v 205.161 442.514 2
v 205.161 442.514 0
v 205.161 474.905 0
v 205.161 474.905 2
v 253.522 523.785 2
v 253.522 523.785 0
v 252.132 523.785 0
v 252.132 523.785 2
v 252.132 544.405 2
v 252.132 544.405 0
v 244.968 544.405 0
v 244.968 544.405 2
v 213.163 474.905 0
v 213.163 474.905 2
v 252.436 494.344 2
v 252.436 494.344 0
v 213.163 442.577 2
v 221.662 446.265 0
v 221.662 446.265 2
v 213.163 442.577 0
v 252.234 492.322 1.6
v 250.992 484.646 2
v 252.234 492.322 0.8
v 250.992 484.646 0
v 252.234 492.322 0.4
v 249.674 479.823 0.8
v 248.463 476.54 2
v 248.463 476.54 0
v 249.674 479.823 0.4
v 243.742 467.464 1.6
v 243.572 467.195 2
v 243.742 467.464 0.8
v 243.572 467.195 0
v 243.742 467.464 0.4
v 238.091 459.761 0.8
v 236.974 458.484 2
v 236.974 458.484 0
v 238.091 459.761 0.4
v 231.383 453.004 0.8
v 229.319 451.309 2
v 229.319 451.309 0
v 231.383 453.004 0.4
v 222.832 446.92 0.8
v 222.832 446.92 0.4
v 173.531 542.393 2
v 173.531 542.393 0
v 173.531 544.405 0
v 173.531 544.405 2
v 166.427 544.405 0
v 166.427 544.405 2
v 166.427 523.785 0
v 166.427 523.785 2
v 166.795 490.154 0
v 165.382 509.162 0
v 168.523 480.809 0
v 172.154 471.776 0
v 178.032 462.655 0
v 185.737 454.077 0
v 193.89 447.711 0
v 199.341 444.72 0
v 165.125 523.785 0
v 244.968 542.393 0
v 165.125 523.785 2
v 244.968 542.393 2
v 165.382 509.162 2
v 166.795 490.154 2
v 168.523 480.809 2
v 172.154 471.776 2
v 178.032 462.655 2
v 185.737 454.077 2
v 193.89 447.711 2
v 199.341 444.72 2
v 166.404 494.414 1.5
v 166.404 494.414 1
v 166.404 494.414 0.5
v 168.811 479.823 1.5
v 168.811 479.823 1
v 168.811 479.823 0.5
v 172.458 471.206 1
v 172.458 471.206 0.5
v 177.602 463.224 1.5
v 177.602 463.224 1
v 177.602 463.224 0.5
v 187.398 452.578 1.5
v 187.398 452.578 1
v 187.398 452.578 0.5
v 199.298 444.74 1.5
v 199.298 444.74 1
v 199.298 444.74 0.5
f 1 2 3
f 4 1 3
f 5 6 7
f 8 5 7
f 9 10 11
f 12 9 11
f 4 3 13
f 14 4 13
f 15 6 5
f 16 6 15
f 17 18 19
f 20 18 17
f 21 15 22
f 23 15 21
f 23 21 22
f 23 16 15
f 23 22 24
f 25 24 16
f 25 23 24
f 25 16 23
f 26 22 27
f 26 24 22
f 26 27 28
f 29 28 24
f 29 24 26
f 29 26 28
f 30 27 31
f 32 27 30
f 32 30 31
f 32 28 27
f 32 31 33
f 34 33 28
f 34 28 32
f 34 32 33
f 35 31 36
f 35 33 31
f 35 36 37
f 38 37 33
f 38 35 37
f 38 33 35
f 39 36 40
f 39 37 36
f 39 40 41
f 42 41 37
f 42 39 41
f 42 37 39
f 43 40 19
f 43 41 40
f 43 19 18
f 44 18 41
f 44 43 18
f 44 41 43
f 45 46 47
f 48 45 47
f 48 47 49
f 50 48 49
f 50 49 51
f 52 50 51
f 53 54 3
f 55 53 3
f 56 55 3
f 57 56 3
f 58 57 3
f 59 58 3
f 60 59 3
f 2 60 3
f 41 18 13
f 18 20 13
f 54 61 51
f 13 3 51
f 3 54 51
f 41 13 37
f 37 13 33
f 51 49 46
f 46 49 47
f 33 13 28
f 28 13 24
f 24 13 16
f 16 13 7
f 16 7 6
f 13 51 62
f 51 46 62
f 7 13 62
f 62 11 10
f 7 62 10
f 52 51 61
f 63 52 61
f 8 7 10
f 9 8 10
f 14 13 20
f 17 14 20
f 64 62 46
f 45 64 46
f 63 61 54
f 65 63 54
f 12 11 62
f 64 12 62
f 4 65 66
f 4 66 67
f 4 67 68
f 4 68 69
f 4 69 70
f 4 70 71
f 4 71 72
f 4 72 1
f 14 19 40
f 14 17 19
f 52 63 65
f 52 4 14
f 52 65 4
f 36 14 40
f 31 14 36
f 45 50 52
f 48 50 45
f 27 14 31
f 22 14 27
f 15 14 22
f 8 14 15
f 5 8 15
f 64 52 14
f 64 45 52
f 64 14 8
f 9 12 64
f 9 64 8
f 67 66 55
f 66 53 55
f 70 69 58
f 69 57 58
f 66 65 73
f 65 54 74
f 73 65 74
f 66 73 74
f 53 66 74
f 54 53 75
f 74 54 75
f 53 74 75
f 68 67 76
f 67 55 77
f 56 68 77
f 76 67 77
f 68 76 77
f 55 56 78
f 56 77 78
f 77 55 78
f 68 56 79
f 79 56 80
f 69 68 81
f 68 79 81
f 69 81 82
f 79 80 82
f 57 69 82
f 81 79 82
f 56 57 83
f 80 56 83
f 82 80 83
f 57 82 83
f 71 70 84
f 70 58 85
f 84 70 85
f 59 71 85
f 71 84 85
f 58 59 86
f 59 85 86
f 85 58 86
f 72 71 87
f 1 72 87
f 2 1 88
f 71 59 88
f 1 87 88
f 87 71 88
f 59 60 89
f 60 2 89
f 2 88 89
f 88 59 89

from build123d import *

# Parameters (mm, degrees)
EXTRUDE_1_DEPTH = 2


with BuildPart() as part:
    # 草图1 → 凸台-拉伸1 (new body)
    with BuildSketch(Plane.XY):
        with BuildLine():
            Line((244.967841267, 542.393386476), (173.531139847, 542.393386476))
            Line((173.531139847, 542.393386476), (173.531139847, 544.404513771))
            Line((173.531139847, 544.404513771), (166.427186265, 544.404513771))
            Line((166.427186265, 544.404513771), (166.427186265, 523.784577737))
            Line((166.427186265, 523.784577737), (165.125301121, 523.784577737))
            Line((165.125301121, 523.784577737), (165.381520735, 509.161664861))
            add(Edge.make_bspline(
                [(165.381520735, 509.161664861), (166.398492196, 499.581380375), (165.660716299, 482.596552628), (178.57521294, 459.918617671), (192.311763969, 447.256935323), (203.145863385, 443.111286653), (205.16102947, 442.514323356)],
                knots=[0, 0, 0, 0, 0.348658777, 0.570107959, 0.906139099, 0.980139945, 0.980139945, 0.980139945, 0.980139945], degree=3))
            Line((205.16102947, 442.514323356), (205.16102947, 472.905120341))
            Line((205.16102947, 472.905120341), (205.16102947, 474.905120341))
            Line((205.16102947, 474.905120341), (213.16329184, 474.905120341))
            Line((213.16329184, 474.905120341), (213.16329184, 472.905120341))
            Line((213.16329184, 472.905120341), (213.16329184, 442.577372397))
            add(Edge.make_bspline(
                [(253.521985396, 523.784577737), (253.388891198, 517.565791469), (253.032140526, 502.963496163), (252.103987956, 483.22463858), (243.331777802, 465.610764177), (231.612343059, 451.708919957), (219.961627576, 444.823878536), (213.16329184, 442.577372397)],
                knots=[0, 0, 0, 0, 0.186773646, 0.443708277, 0.581360863, 0.772361396, 0.983204581, 0.983204581, 0.983204581, 0.983204581], degree=3))
            Line((253.521985396, 523.784577737), (252.132324541, 523.784577737))
            Line((252.132324541, 523.784577737), (252.132324541, 544.404513771))
            Line((252.132324541, 544.404513771), (244.967841267, 544.404513771))
            Line((244.967841267, 544.404513771), (244.967841267, 542.393386476))
        make_face()
    extrude(amount=EXTRUDE_1_DEPTH)


solid = part.part
